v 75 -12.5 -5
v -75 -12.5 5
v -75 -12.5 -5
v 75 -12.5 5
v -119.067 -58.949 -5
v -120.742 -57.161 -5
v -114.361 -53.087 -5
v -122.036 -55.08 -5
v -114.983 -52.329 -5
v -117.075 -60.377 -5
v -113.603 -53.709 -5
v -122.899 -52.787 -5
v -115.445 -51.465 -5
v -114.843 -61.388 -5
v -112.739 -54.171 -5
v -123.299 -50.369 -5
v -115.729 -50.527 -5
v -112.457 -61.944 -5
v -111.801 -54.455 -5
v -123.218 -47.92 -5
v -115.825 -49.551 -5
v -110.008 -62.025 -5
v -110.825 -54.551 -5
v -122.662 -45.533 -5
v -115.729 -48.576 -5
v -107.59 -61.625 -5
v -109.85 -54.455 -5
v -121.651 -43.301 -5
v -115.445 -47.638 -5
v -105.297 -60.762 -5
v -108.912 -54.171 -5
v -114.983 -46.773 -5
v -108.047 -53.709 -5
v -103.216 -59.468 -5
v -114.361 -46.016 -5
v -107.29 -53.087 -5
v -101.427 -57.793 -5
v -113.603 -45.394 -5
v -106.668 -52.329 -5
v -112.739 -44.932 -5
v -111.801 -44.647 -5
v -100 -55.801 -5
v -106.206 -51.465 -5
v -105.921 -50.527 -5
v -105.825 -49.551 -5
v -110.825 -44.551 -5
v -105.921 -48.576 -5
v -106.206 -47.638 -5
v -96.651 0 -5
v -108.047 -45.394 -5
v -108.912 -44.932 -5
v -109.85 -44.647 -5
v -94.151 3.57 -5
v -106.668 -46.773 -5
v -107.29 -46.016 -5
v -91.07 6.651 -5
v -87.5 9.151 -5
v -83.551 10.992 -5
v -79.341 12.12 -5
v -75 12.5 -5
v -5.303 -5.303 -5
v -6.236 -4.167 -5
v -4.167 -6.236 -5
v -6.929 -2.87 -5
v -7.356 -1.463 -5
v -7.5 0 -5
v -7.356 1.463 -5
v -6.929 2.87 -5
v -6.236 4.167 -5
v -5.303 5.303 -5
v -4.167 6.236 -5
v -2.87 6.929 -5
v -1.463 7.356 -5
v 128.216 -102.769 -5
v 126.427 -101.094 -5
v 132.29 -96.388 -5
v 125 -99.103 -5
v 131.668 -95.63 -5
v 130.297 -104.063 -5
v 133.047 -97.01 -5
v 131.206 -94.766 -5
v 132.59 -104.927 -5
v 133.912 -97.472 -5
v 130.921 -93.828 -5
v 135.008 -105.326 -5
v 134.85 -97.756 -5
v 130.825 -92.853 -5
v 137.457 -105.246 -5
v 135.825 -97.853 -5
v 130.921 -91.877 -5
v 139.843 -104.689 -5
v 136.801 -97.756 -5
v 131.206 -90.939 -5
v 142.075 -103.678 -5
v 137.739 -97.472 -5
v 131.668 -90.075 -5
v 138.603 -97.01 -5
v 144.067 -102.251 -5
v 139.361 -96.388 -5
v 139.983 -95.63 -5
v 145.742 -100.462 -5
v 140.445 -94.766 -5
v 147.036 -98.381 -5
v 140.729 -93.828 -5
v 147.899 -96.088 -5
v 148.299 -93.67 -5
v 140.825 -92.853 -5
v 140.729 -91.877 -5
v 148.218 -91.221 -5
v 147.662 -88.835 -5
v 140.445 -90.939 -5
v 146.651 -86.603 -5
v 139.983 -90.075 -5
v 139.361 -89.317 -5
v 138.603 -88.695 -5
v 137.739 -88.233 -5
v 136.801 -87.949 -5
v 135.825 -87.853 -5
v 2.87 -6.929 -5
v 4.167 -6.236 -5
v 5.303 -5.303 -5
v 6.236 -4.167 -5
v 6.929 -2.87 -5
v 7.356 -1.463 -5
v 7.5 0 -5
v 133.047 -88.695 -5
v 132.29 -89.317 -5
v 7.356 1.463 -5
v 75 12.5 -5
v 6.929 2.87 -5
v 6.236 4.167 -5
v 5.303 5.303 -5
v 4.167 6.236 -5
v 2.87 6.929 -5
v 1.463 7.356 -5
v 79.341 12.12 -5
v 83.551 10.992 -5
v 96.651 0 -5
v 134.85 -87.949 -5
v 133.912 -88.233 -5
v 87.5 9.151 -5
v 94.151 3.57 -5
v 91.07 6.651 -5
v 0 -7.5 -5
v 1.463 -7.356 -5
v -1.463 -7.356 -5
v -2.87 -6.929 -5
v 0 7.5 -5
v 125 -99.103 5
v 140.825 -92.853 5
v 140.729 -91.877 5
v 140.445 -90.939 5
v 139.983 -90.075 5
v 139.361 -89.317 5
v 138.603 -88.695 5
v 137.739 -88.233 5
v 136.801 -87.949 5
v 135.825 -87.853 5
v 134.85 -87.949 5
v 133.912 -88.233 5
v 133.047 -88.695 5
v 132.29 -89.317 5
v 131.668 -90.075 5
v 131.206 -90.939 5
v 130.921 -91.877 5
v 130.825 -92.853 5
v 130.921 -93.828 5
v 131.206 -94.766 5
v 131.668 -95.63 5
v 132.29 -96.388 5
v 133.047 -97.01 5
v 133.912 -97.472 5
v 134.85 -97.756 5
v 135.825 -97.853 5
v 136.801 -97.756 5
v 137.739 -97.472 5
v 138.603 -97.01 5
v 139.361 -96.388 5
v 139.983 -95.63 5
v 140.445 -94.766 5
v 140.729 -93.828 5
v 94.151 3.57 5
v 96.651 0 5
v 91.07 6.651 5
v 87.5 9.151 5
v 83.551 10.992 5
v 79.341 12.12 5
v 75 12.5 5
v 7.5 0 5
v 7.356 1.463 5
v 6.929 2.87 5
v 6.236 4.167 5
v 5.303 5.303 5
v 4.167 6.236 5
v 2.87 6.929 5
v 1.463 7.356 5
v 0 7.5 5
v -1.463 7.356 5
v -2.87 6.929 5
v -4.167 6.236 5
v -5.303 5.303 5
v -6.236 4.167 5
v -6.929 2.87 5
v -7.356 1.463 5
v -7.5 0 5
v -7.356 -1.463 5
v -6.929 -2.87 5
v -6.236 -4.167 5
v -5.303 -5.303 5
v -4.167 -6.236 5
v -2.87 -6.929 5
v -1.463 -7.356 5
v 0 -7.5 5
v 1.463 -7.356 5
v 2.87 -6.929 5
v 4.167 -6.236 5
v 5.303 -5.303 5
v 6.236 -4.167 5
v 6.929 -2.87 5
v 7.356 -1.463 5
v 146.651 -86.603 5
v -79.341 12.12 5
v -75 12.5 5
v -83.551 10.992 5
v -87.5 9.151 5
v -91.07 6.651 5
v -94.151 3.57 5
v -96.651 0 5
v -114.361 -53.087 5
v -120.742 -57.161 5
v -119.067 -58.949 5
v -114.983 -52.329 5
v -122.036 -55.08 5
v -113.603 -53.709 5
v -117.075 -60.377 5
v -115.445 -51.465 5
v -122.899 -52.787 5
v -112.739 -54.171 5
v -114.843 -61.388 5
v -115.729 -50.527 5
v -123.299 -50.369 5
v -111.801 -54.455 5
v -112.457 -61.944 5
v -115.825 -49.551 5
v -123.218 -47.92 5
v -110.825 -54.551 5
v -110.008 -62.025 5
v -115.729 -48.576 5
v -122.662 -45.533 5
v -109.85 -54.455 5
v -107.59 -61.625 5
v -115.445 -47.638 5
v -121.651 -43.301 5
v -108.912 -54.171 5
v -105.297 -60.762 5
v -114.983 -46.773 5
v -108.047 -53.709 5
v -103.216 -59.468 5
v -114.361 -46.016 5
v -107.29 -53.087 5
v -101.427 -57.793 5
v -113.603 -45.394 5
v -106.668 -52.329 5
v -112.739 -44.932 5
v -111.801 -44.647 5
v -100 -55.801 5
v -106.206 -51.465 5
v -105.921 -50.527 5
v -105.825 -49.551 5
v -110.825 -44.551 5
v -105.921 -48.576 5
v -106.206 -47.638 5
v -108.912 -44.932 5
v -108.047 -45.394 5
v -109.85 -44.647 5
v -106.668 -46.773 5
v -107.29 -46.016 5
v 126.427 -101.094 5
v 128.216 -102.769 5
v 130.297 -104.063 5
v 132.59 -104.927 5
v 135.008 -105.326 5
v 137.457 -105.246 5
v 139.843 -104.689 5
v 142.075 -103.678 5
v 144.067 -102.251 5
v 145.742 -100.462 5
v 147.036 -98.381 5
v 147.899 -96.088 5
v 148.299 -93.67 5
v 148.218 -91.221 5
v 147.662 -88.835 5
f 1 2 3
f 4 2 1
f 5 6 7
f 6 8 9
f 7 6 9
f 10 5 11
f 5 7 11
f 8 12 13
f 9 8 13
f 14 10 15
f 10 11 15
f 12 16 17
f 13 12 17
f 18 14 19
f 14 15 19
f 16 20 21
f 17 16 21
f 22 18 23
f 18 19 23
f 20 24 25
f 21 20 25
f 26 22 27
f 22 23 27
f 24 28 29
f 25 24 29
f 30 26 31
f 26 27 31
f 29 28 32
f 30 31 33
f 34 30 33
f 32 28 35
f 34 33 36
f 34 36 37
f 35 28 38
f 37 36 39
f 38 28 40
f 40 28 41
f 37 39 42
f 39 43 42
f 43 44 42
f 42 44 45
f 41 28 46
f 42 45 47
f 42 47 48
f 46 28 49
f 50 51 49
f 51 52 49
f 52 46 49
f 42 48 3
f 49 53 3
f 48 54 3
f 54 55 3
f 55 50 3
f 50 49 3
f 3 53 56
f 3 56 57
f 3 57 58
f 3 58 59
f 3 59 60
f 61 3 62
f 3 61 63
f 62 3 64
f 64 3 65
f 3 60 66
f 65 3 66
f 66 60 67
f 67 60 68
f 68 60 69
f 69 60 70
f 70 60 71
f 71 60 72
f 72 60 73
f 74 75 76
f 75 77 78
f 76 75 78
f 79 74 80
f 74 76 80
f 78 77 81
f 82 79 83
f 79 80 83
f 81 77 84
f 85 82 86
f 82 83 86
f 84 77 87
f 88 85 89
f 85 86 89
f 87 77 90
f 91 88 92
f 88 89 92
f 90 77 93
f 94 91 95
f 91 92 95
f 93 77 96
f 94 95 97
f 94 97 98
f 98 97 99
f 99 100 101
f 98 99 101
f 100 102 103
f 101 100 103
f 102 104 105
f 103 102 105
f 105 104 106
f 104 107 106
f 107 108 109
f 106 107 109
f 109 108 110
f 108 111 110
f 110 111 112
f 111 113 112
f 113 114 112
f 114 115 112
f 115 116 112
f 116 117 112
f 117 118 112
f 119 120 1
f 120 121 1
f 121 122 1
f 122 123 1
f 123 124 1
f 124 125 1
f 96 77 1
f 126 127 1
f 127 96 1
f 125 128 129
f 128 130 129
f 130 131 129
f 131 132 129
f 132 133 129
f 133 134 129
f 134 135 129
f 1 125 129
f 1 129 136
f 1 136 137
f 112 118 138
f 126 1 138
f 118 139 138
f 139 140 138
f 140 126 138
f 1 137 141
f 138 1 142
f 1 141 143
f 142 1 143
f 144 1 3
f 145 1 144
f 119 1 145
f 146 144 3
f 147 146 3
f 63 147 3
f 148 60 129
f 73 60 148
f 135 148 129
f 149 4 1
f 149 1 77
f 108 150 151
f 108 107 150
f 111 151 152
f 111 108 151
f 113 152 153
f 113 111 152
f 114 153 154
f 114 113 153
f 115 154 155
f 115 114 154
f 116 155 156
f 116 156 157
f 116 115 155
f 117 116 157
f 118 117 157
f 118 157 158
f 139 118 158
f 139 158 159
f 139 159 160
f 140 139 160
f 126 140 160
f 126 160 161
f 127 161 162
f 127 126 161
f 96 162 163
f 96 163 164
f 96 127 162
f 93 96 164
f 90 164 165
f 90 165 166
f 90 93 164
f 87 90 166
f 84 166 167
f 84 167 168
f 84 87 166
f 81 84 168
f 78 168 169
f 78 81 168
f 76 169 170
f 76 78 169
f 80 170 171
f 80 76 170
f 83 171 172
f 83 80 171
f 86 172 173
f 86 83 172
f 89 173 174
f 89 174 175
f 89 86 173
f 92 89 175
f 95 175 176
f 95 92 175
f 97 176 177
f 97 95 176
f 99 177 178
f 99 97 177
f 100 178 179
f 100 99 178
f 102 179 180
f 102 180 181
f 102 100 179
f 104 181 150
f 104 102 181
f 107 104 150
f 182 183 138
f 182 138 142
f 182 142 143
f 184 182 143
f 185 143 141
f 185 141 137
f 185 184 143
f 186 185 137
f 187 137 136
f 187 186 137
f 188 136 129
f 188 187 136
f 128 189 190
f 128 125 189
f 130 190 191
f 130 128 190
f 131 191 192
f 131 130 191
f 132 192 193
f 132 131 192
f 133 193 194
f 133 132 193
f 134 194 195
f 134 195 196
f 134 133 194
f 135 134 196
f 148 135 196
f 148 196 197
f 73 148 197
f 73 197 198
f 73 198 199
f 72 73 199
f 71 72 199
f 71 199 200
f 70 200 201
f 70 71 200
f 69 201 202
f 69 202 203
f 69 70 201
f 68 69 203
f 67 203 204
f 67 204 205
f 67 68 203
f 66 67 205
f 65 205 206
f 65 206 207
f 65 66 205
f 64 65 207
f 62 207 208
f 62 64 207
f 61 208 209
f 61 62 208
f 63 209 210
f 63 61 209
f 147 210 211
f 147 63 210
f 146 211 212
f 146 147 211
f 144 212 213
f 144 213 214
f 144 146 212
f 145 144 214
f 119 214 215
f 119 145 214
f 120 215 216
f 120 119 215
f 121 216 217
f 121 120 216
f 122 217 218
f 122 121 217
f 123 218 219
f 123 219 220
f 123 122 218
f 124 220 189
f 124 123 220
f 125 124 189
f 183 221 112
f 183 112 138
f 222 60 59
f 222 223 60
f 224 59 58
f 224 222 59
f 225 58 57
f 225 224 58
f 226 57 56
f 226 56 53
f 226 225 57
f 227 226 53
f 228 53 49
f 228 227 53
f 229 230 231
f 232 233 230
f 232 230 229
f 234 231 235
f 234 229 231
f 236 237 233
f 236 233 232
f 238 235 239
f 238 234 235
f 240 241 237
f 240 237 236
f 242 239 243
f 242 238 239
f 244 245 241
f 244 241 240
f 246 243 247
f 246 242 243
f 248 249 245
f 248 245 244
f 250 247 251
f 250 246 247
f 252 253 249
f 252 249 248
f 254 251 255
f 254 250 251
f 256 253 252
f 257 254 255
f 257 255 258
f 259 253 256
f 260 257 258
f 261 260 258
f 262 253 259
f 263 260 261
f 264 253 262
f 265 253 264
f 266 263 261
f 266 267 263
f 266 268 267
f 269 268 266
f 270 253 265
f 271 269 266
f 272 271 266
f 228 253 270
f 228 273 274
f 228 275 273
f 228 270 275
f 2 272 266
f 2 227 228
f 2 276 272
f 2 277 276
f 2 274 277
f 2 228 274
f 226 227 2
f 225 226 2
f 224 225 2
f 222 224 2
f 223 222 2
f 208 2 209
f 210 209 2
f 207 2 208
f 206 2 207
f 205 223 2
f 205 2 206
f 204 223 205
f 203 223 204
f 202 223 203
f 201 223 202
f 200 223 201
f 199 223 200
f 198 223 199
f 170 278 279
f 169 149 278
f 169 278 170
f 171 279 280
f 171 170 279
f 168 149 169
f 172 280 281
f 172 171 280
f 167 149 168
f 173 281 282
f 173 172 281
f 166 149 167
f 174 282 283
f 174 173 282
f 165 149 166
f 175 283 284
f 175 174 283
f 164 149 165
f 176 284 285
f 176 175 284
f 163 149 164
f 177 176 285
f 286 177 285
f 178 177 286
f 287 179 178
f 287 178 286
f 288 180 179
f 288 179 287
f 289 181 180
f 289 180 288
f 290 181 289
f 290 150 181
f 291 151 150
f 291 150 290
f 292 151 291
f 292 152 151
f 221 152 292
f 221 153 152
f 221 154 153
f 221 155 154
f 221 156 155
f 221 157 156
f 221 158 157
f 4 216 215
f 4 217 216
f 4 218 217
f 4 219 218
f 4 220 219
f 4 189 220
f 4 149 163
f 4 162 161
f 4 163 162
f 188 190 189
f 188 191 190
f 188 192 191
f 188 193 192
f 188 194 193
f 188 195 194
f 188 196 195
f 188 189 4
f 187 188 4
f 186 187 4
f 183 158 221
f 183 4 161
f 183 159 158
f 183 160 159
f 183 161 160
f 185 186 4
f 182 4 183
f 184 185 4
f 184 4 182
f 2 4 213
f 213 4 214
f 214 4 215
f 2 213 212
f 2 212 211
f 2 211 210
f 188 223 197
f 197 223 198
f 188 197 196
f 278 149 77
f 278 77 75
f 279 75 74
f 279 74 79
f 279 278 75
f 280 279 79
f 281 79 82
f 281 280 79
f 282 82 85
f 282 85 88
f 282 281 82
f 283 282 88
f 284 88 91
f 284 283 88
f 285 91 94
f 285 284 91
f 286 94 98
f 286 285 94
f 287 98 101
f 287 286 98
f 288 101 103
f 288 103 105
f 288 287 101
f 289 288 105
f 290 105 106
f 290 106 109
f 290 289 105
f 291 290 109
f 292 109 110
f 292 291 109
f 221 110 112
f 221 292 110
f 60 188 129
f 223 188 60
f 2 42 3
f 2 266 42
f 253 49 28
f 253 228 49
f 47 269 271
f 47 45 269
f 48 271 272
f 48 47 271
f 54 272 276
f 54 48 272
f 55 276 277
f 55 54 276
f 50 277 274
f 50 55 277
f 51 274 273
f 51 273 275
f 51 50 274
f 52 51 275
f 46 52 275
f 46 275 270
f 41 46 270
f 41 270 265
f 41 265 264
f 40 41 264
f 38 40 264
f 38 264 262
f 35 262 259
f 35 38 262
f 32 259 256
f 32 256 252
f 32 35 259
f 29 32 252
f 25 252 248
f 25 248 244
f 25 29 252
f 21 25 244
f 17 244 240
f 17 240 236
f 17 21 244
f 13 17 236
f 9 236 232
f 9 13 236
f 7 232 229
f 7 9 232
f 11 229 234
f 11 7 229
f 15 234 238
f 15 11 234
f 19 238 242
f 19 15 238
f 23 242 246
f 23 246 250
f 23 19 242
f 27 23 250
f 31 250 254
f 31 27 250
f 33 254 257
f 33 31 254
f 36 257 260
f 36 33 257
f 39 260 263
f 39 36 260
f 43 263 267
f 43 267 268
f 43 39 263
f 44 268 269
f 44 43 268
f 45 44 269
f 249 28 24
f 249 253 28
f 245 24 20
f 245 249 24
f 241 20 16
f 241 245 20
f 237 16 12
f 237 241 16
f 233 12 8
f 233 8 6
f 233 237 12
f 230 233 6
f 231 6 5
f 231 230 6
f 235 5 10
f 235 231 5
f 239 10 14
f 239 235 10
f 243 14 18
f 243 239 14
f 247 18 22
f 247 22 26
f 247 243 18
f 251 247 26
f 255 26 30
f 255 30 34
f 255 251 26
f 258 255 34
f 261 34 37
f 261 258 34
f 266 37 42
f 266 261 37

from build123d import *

# Parameters (mm, degrees)
SKETCH1_R           = 7.5
SKETCH1_R_2         = 5
BOSS_EXTRUDE1_DEPTH = 5


with BuildPart() as part:
    # Sketch1 → Boss-Extrude1 (new, symmetric)
    with BuildSketch(Plane.XY):
        with BuildLine():
            Line((-75, -12.5), (75, -12.5))
            Line((75, -12.5), (125, -99.102540378))
            ThreePointArc((125, -99.102540378), (142.075317547, -103.677857926), (146.650635095, -86.602540378))
            Line((146.650635095, -86.602540378), (96.650635095, 0))
            ThreePointArc((96.650635095, 0), (87.5, 9.150635095), (75, 12.5))
            Line((75, 12.5), (-75, 12.5))
            ThreePointArc((-75, 12.5), (-87.5, 9.150635095), (-96.650635095, 0))
            Line((-96.650635095, 0), (-121.650635095, -43.301270189))
            ThreePointArc((-121.650635095, -43.301270189), (-117.075317547, -60.376587737), (-100, -55.801270189))
            Line((-100, -55.801270189), (-75, -12.5))
        make_face()
        Circle(SKETCH1_R, mode=Mode.SUBTRACT)
        with Locations((135.825317547, -92.852540378)):
            Circle(SKETCH1_R_2, mode=Mode.SUBTRACT)
        with Locations((-110.825317547, -49.551270189)):
            Circle(SKETCH1_R_2, mode=Mode.SUBTRACT)
    extrude(amount=BOSS_EXTRUDE1_DEPTH, both=True)


solid = part.part
